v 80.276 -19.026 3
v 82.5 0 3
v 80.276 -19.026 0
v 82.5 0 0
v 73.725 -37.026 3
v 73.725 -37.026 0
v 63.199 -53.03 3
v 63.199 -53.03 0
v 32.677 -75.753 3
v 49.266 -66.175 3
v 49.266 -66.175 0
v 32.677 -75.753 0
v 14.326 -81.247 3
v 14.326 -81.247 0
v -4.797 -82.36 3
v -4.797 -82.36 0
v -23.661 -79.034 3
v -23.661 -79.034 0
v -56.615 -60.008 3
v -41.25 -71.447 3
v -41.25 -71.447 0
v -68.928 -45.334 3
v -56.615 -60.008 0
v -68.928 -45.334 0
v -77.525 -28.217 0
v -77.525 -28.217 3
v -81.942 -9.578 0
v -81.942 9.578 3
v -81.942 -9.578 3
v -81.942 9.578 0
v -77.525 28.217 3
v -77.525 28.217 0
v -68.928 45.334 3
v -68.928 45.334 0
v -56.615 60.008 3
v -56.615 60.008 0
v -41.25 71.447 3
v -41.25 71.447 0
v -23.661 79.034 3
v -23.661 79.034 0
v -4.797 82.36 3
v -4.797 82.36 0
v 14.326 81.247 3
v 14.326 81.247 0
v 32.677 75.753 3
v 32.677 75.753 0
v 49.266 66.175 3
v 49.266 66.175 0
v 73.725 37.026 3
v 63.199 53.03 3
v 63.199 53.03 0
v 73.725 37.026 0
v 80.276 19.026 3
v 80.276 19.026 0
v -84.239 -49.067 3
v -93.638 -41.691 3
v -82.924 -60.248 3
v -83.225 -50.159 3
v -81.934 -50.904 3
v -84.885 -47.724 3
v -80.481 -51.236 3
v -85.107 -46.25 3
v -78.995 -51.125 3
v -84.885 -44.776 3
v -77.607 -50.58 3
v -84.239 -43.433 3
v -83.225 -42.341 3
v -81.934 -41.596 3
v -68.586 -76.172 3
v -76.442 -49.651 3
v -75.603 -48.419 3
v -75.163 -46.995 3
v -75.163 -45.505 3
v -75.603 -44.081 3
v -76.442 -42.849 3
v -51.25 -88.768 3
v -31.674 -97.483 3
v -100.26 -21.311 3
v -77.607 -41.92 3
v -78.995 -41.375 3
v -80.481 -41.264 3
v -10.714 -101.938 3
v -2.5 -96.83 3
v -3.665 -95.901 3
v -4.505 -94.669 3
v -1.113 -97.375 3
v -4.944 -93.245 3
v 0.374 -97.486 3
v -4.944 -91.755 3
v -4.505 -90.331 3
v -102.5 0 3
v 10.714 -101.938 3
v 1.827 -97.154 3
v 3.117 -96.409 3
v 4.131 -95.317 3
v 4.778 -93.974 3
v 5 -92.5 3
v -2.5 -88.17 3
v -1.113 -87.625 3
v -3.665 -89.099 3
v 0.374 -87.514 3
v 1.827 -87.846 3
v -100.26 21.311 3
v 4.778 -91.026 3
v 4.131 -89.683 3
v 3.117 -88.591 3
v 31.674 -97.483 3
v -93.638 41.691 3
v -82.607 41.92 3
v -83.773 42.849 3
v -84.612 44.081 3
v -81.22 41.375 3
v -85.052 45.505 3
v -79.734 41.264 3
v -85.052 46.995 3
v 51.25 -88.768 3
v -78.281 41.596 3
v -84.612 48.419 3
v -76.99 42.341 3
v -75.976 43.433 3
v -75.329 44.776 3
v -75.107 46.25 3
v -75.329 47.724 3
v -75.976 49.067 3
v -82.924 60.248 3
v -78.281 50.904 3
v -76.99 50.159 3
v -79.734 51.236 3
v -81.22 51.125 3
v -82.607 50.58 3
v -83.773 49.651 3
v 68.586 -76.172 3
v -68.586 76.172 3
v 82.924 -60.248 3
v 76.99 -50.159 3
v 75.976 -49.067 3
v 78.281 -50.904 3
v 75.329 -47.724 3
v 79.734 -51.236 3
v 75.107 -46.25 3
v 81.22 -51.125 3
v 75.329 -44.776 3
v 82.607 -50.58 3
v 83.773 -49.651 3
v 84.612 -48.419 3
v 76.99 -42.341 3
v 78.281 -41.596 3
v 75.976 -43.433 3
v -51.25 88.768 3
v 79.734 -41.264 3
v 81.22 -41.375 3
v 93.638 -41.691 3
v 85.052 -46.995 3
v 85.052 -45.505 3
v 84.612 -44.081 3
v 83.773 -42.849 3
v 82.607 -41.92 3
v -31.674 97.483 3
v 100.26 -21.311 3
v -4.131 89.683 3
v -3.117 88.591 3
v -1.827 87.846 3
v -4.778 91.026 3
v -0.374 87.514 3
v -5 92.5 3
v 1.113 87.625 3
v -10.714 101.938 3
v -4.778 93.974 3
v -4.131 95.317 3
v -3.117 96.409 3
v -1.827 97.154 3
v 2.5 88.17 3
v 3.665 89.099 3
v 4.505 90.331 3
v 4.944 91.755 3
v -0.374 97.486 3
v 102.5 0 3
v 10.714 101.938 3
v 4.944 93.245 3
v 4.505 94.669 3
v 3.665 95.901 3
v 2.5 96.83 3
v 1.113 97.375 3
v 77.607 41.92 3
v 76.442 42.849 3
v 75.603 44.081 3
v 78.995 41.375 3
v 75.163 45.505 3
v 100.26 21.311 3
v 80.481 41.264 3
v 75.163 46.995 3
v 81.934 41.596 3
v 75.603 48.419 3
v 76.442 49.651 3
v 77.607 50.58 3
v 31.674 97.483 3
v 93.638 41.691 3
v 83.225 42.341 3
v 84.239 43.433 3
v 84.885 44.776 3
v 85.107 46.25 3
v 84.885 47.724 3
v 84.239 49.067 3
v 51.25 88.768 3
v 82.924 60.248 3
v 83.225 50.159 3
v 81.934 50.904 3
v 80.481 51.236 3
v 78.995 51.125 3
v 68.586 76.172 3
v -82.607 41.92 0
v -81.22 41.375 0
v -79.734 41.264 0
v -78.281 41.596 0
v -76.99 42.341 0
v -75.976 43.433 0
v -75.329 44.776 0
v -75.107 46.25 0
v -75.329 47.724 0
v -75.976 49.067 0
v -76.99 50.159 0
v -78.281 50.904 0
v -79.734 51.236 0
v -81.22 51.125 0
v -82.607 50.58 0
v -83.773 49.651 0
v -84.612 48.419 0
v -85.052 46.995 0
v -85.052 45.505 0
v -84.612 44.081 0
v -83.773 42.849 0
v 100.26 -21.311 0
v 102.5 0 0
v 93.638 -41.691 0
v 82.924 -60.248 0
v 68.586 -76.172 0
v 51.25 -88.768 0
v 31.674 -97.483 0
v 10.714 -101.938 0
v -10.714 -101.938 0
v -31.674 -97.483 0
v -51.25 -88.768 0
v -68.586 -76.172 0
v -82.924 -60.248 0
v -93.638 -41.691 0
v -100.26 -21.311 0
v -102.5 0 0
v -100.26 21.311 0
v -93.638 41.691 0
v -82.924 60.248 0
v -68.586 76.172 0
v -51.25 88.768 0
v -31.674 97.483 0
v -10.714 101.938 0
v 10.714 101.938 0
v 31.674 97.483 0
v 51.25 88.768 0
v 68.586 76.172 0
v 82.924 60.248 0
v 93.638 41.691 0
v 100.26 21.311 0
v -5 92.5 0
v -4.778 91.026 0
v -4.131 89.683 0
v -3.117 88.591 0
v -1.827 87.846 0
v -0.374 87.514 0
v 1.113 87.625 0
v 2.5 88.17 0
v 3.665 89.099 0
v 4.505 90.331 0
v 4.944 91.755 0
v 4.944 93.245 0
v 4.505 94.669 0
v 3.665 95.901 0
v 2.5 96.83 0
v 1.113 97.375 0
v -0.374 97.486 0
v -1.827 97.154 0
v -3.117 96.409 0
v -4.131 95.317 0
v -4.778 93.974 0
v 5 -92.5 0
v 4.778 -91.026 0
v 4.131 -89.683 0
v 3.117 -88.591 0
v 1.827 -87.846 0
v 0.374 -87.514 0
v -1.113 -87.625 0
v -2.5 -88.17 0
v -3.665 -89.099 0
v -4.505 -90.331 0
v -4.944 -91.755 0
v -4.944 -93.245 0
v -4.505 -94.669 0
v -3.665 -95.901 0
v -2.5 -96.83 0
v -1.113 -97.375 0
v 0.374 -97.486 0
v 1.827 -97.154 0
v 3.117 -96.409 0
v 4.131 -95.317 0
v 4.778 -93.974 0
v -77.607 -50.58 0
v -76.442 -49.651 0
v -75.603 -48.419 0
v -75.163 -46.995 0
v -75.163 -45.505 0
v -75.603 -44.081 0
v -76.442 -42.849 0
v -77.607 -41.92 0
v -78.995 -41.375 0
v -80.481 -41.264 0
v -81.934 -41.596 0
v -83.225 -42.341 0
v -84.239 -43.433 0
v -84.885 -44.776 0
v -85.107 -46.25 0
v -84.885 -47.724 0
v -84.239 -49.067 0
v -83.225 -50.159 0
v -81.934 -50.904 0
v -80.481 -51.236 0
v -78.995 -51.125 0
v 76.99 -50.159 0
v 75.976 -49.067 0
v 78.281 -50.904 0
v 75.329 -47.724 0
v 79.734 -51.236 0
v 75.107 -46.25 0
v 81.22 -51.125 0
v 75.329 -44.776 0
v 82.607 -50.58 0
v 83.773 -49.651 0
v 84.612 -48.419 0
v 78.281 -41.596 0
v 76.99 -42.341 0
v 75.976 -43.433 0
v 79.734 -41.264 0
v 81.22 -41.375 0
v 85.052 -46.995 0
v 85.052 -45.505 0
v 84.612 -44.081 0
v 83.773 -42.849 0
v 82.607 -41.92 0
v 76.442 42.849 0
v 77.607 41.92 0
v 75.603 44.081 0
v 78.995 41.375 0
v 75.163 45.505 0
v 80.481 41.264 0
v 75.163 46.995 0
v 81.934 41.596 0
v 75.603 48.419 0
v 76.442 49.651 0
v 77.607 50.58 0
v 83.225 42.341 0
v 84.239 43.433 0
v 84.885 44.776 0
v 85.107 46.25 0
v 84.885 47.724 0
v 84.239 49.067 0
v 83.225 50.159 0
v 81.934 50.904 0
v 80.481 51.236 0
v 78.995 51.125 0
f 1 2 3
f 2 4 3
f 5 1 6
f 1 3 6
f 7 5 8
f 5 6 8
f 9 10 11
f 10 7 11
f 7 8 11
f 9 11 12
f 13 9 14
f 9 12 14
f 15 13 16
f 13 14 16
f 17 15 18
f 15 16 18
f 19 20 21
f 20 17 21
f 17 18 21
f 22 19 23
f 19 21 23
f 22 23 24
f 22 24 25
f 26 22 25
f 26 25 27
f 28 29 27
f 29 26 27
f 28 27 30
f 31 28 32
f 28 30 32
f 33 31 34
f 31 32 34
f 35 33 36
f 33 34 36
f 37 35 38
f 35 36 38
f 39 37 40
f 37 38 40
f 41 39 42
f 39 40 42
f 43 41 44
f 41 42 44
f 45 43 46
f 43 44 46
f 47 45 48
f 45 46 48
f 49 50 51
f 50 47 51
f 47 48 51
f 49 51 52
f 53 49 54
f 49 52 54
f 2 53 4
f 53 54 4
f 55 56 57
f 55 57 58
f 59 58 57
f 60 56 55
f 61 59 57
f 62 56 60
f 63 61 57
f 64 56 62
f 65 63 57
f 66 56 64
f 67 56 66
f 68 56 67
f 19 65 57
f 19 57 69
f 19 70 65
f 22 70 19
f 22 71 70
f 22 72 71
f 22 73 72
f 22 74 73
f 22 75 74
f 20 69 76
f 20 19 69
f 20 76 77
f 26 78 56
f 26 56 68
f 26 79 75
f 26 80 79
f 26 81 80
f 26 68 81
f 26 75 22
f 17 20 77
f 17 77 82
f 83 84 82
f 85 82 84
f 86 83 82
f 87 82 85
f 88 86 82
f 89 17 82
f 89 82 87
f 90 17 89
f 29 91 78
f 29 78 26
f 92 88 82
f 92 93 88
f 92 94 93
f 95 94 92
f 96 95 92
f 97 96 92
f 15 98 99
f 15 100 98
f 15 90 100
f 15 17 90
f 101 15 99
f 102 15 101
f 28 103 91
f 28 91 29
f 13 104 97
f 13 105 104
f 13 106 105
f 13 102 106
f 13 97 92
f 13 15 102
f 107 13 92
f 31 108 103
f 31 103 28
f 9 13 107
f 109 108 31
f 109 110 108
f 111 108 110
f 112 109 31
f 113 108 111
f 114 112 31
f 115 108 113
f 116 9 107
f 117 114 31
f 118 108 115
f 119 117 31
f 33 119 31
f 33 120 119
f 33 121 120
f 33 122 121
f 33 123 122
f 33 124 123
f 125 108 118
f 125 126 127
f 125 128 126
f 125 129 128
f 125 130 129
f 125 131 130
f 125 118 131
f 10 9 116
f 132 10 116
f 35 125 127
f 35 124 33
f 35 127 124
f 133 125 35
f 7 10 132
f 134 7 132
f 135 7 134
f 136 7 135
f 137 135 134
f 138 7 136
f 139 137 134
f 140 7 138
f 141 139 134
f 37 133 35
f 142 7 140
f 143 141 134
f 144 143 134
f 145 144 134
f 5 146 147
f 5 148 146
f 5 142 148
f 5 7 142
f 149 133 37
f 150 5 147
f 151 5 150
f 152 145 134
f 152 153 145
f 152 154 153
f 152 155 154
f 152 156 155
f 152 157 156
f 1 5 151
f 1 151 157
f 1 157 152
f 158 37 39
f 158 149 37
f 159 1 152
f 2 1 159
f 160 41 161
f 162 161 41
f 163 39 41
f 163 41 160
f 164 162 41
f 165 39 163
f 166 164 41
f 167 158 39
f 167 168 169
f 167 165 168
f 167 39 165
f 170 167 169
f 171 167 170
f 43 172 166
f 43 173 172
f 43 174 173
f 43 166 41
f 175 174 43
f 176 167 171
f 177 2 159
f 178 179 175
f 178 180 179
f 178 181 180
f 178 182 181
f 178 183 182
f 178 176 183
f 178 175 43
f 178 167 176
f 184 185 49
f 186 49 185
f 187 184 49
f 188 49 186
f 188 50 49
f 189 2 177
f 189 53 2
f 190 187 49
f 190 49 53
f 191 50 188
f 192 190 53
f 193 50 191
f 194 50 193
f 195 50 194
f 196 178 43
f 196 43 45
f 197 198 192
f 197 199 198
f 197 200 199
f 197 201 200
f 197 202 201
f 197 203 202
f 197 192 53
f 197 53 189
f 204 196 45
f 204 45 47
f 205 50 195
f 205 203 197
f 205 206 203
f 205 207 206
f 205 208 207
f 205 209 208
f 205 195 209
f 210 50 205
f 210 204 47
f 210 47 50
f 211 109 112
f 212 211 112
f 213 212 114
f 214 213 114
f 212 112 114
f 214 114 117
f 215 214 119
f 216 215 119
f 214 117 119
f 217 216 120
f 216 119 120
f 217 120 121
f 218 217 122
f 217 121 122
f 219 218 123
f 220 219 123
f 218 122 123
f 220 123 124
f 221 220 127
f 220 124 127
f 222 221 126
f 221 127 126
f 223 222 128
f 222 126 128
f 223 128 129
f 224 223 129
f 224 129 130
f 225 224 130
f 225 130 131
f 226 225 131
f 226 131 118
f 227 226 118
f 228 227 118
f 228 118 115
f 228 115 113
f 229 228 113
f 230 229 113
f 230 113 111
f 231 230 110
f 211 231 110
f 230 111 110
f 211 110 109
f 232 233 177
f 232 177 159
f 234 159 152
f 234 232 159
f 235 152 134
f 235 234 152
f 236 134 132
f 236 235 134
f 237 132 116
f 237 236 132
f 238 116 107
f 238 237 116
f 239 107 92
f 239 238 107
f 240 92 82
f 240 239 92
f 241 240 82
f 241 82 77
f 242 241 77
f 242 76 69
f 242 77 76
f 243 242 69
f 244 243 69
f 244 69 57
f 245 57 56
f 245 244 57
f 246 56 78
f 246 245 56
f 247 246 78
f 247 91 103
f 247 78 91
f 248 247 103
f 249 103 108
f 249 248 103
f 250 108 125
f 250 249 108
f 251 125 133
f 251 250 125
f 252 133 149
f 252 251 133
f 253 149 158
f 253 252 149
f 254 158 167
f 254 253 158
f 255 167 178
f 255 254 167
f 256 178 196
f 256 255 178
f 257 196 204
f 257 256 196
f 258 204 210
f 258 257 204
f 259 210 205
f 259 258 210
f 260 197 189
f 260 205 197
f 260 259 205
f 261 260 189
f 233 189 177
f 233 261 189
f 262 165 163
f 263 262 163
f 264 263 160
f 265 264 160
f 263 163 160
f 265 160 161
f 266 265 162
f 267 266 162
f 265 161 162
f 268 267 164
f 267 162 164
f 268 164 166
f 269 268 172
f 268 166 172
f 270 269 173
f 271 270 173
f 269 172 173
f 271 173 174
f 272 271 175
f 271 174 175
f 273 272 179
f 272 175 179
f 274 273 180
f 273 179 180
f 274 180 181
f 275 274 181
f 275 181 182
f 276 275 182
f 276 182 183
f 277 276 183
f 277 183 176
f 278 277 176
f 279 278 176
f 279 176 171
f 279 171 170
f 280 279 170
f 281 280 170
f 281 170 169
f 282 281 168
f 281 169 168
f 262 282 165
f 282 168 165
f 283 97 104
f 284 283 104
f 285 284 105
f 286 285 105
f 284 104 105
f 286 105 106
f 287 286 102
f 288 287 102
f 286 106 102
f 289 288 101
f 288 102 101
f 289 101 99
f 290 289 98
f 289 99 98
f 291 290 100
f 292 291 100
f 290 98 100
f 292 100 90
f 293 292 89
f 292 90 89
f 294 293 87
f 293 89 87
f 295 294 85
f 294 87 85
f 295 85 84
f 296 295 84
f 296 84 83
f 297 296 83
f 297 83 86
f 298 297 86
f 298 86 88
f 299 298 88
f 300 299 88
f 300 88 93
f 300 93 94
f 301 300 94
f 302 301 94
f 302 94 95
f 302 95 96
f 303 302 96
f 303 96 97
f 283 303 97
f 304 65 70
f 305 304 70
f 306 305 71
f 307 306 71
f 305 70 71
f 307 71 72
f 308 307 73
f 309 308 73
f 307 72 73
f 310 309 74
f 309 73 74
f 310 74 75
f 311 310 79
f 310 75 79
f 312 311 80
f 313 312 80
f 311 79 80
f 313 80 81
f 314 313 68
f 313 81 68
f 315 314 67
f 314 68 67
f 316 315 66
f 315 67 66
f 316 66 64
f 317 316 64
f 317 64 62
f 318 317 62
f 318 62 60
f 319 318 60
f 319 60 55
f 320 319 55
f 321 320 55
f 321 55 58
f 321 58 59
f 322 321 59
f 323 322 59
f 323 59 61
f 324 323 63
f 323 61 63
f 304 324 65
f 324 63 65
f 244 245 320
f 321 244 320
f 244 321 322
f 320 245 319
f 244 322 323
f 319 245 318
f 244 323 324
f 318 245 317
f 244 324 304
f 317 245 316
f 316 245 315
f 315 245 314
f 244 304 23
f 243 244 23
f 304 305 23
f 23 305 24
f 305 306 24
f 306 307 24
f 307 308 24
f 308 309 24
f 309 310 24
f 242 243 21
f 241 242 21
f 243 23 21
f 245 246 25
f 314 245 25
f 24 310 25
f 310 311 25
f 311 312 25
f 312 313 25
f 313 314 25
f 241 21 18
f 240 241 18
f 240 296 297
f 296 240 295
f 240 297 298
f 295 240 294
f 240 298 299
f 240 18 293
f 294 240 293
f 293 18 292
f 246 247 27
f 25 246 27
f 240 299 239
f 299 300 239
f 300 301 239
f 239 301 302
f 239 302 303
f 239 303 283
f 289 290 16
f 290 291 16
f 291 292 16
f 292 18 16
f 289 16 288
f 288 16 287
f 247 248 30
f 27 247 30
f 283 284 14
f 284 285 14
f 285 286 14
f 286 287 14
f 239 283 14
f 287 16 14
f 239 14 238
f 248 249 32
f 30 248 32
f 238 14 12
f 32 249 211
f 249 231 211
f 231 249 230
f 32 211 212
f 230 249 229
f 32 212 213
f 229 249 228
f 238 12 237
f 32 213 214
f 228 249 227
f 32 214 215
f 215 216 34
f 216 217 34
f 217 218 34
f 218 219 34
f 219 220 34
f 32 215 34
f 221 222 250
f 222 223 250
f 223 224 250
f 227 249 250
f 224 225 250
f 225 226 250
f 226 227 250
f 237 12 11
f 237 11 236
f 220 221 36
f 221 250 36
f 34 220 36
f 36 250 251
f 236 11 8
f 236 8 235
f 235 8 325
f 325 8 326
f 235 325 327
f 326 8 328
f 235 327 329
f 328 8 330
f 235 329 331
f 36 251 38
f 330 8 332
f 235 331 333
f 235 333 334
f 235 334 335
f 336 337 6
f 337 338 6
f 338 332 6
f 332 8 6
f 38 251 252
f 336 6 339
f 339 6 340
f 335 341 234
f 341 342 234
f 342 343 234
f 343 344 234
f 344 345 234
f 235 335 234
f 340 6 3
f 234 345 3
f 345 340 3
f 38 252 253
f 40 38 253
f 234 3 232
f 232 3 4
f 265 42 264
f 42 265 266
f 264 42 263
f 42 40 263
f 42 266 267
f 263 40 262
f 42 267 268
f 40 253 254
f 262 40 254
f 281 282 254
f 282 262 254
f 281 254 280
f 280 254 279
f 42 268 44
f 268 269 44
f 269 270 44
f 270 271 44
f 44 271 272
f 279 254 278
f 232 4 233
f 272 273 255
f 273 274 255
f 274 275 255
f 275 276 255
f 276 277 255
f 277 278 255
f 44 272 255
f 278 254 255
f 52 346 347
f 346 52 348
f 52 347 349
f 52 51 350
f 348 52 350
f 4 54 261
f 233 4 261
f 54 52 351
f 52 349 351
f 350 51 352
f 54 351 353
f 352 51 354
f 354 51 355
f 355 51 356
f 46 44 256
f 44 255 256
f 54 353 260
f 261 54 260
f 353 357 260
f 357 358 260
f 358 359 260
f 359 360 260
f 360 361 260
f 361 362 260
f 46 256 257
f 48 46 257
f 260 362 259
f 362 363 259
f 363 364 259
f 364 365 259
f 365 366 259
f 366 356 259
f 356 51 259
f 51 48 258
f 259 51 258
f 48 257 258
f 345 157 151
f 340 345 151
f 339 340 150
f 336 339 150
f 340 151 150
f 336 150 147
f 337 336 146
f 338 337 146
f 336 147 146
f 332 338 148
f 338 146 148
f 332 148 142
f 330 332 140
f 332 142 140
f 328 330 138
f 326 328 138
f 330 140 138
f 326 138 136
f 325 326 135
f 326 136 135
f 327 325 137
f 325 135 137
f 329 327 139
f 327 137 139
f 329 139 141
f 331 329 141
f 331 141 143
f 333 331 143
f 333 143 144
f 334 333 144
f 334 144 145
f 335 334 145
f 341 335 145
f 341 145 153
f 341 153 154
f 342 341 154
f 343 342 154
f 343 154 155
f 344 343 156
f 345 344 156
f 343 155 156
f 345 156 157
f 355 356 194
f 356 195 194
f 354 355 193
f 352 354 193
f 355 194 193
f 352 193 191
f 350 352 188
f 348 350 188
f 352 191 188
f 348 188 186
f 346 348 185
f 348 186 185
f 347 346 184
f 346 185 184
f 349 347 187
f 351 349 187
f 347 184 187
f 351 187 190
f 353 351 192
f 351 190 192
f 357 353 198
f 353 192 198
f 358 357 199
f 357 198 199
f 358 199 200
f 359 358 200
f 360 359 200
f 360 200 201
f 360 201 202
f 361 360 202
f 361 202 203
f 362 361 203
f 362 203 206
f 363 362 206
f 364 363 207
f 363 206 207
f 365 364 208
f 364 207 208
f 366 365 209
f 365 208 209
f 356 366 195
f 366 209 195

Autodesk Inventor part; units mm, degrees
ref_plane "YZ Plane" through (0, 0, 0) normal (1, 0, 0) x (0, 1, 0)
ref_plane "XZ Plane" through (0, 0, 0) normal (0, 1, 0) x (-1, 0, 0)
ref_plane "XY Plane" through (0, 0, 0) normal (0, 0, 1) x (1, 0, 0)
sketch "Sketch1" plane through (0, 0, 0) normal (0, 0, 1) x (1, 0, 0)
  circle A0 centre (0, 0) radius 82.5
  circle A1 centre (0, 0) radius 102.5
  circle A2 centre (0, 0) radius 92.5 construction
  line L0 (0, 102.5) -> (0, 82.5) construction
  point P0 (0, 92.5)
  dimension "d30" = 165
  dimension "d32" = 205
extrude "Plate1" add sketch "Sketch1" along normal blind 3
sketch "Sketch2" plane through (0, 0, 3) normal (0, 0, 1) x (1, 0, 0)
  circle A0 centre (0, 0) radius 82.5 construction
  circle A1 centre (0, 0) radius 102.5 construction
  circle A2 centre (0, 0) radius 102.5 construction
  circle A3 centre (0, 0) radius 82.5 construction
  circle A4 centre (0, -92.5) radius 5
  circle A5 centre (0, 0) radius 92.5 construction
  dimension "d31" = 185
  dimension "d21" = 10
extrude "Extrusion1" cut sketch "Sketch2" against normal through all
pattern_circular "Circular Pattern2" count 6 over 360 about axis through (0, 0, 0) along (0, 0, 1) of "Extrusion1"
equation "\"d30\" = back_steel_circle_внутр_диам"
equation "\"d32\" = back_steel_circle_внутр_диам + back_steel_circle_ширина_кольца"
equation "\"d31\" = back_steel_circle_диам_центров"
equation "\"d21\" = back_steel_circle_диам_шпильки"
equation "\"d2\" = Thickness"
equation "\"BendRadius\" = Thickness"
equation "\"BendReliefWidth\" = Thickness"
equation "\"BendReliefDepth\" = 0.5 * Thickness"
equation "\"CornerReliefSize\" = 4 * Thickness"
equation "\"MinimumRemnant\" = 2 * Thickness"
equation "\"TransitionRadius\" = BendRadius"
equation "\"JacobiRadiusSize\" = BendRadius"
equation "\"GapSize\" = Thickness"
equation "\"back_steel_circle_диам_центров\" = back_steel_circle_внутр_диам + 0.5 * back_steel_circle_ширина_кольца"
equation "\"back_steel_circle_диам_шпильки\" = 10"
equation "\"back_steel_circle_проходной_диаметр\" = 125"
equation "\"back_steel_circle_внутр_диам\" = 165"
equation "\"back_steel_circle_ширина_кольца\" = 40"
equation "\"Thickness\" = 3"
properties part number "NVPH-321 joint steel ring"
